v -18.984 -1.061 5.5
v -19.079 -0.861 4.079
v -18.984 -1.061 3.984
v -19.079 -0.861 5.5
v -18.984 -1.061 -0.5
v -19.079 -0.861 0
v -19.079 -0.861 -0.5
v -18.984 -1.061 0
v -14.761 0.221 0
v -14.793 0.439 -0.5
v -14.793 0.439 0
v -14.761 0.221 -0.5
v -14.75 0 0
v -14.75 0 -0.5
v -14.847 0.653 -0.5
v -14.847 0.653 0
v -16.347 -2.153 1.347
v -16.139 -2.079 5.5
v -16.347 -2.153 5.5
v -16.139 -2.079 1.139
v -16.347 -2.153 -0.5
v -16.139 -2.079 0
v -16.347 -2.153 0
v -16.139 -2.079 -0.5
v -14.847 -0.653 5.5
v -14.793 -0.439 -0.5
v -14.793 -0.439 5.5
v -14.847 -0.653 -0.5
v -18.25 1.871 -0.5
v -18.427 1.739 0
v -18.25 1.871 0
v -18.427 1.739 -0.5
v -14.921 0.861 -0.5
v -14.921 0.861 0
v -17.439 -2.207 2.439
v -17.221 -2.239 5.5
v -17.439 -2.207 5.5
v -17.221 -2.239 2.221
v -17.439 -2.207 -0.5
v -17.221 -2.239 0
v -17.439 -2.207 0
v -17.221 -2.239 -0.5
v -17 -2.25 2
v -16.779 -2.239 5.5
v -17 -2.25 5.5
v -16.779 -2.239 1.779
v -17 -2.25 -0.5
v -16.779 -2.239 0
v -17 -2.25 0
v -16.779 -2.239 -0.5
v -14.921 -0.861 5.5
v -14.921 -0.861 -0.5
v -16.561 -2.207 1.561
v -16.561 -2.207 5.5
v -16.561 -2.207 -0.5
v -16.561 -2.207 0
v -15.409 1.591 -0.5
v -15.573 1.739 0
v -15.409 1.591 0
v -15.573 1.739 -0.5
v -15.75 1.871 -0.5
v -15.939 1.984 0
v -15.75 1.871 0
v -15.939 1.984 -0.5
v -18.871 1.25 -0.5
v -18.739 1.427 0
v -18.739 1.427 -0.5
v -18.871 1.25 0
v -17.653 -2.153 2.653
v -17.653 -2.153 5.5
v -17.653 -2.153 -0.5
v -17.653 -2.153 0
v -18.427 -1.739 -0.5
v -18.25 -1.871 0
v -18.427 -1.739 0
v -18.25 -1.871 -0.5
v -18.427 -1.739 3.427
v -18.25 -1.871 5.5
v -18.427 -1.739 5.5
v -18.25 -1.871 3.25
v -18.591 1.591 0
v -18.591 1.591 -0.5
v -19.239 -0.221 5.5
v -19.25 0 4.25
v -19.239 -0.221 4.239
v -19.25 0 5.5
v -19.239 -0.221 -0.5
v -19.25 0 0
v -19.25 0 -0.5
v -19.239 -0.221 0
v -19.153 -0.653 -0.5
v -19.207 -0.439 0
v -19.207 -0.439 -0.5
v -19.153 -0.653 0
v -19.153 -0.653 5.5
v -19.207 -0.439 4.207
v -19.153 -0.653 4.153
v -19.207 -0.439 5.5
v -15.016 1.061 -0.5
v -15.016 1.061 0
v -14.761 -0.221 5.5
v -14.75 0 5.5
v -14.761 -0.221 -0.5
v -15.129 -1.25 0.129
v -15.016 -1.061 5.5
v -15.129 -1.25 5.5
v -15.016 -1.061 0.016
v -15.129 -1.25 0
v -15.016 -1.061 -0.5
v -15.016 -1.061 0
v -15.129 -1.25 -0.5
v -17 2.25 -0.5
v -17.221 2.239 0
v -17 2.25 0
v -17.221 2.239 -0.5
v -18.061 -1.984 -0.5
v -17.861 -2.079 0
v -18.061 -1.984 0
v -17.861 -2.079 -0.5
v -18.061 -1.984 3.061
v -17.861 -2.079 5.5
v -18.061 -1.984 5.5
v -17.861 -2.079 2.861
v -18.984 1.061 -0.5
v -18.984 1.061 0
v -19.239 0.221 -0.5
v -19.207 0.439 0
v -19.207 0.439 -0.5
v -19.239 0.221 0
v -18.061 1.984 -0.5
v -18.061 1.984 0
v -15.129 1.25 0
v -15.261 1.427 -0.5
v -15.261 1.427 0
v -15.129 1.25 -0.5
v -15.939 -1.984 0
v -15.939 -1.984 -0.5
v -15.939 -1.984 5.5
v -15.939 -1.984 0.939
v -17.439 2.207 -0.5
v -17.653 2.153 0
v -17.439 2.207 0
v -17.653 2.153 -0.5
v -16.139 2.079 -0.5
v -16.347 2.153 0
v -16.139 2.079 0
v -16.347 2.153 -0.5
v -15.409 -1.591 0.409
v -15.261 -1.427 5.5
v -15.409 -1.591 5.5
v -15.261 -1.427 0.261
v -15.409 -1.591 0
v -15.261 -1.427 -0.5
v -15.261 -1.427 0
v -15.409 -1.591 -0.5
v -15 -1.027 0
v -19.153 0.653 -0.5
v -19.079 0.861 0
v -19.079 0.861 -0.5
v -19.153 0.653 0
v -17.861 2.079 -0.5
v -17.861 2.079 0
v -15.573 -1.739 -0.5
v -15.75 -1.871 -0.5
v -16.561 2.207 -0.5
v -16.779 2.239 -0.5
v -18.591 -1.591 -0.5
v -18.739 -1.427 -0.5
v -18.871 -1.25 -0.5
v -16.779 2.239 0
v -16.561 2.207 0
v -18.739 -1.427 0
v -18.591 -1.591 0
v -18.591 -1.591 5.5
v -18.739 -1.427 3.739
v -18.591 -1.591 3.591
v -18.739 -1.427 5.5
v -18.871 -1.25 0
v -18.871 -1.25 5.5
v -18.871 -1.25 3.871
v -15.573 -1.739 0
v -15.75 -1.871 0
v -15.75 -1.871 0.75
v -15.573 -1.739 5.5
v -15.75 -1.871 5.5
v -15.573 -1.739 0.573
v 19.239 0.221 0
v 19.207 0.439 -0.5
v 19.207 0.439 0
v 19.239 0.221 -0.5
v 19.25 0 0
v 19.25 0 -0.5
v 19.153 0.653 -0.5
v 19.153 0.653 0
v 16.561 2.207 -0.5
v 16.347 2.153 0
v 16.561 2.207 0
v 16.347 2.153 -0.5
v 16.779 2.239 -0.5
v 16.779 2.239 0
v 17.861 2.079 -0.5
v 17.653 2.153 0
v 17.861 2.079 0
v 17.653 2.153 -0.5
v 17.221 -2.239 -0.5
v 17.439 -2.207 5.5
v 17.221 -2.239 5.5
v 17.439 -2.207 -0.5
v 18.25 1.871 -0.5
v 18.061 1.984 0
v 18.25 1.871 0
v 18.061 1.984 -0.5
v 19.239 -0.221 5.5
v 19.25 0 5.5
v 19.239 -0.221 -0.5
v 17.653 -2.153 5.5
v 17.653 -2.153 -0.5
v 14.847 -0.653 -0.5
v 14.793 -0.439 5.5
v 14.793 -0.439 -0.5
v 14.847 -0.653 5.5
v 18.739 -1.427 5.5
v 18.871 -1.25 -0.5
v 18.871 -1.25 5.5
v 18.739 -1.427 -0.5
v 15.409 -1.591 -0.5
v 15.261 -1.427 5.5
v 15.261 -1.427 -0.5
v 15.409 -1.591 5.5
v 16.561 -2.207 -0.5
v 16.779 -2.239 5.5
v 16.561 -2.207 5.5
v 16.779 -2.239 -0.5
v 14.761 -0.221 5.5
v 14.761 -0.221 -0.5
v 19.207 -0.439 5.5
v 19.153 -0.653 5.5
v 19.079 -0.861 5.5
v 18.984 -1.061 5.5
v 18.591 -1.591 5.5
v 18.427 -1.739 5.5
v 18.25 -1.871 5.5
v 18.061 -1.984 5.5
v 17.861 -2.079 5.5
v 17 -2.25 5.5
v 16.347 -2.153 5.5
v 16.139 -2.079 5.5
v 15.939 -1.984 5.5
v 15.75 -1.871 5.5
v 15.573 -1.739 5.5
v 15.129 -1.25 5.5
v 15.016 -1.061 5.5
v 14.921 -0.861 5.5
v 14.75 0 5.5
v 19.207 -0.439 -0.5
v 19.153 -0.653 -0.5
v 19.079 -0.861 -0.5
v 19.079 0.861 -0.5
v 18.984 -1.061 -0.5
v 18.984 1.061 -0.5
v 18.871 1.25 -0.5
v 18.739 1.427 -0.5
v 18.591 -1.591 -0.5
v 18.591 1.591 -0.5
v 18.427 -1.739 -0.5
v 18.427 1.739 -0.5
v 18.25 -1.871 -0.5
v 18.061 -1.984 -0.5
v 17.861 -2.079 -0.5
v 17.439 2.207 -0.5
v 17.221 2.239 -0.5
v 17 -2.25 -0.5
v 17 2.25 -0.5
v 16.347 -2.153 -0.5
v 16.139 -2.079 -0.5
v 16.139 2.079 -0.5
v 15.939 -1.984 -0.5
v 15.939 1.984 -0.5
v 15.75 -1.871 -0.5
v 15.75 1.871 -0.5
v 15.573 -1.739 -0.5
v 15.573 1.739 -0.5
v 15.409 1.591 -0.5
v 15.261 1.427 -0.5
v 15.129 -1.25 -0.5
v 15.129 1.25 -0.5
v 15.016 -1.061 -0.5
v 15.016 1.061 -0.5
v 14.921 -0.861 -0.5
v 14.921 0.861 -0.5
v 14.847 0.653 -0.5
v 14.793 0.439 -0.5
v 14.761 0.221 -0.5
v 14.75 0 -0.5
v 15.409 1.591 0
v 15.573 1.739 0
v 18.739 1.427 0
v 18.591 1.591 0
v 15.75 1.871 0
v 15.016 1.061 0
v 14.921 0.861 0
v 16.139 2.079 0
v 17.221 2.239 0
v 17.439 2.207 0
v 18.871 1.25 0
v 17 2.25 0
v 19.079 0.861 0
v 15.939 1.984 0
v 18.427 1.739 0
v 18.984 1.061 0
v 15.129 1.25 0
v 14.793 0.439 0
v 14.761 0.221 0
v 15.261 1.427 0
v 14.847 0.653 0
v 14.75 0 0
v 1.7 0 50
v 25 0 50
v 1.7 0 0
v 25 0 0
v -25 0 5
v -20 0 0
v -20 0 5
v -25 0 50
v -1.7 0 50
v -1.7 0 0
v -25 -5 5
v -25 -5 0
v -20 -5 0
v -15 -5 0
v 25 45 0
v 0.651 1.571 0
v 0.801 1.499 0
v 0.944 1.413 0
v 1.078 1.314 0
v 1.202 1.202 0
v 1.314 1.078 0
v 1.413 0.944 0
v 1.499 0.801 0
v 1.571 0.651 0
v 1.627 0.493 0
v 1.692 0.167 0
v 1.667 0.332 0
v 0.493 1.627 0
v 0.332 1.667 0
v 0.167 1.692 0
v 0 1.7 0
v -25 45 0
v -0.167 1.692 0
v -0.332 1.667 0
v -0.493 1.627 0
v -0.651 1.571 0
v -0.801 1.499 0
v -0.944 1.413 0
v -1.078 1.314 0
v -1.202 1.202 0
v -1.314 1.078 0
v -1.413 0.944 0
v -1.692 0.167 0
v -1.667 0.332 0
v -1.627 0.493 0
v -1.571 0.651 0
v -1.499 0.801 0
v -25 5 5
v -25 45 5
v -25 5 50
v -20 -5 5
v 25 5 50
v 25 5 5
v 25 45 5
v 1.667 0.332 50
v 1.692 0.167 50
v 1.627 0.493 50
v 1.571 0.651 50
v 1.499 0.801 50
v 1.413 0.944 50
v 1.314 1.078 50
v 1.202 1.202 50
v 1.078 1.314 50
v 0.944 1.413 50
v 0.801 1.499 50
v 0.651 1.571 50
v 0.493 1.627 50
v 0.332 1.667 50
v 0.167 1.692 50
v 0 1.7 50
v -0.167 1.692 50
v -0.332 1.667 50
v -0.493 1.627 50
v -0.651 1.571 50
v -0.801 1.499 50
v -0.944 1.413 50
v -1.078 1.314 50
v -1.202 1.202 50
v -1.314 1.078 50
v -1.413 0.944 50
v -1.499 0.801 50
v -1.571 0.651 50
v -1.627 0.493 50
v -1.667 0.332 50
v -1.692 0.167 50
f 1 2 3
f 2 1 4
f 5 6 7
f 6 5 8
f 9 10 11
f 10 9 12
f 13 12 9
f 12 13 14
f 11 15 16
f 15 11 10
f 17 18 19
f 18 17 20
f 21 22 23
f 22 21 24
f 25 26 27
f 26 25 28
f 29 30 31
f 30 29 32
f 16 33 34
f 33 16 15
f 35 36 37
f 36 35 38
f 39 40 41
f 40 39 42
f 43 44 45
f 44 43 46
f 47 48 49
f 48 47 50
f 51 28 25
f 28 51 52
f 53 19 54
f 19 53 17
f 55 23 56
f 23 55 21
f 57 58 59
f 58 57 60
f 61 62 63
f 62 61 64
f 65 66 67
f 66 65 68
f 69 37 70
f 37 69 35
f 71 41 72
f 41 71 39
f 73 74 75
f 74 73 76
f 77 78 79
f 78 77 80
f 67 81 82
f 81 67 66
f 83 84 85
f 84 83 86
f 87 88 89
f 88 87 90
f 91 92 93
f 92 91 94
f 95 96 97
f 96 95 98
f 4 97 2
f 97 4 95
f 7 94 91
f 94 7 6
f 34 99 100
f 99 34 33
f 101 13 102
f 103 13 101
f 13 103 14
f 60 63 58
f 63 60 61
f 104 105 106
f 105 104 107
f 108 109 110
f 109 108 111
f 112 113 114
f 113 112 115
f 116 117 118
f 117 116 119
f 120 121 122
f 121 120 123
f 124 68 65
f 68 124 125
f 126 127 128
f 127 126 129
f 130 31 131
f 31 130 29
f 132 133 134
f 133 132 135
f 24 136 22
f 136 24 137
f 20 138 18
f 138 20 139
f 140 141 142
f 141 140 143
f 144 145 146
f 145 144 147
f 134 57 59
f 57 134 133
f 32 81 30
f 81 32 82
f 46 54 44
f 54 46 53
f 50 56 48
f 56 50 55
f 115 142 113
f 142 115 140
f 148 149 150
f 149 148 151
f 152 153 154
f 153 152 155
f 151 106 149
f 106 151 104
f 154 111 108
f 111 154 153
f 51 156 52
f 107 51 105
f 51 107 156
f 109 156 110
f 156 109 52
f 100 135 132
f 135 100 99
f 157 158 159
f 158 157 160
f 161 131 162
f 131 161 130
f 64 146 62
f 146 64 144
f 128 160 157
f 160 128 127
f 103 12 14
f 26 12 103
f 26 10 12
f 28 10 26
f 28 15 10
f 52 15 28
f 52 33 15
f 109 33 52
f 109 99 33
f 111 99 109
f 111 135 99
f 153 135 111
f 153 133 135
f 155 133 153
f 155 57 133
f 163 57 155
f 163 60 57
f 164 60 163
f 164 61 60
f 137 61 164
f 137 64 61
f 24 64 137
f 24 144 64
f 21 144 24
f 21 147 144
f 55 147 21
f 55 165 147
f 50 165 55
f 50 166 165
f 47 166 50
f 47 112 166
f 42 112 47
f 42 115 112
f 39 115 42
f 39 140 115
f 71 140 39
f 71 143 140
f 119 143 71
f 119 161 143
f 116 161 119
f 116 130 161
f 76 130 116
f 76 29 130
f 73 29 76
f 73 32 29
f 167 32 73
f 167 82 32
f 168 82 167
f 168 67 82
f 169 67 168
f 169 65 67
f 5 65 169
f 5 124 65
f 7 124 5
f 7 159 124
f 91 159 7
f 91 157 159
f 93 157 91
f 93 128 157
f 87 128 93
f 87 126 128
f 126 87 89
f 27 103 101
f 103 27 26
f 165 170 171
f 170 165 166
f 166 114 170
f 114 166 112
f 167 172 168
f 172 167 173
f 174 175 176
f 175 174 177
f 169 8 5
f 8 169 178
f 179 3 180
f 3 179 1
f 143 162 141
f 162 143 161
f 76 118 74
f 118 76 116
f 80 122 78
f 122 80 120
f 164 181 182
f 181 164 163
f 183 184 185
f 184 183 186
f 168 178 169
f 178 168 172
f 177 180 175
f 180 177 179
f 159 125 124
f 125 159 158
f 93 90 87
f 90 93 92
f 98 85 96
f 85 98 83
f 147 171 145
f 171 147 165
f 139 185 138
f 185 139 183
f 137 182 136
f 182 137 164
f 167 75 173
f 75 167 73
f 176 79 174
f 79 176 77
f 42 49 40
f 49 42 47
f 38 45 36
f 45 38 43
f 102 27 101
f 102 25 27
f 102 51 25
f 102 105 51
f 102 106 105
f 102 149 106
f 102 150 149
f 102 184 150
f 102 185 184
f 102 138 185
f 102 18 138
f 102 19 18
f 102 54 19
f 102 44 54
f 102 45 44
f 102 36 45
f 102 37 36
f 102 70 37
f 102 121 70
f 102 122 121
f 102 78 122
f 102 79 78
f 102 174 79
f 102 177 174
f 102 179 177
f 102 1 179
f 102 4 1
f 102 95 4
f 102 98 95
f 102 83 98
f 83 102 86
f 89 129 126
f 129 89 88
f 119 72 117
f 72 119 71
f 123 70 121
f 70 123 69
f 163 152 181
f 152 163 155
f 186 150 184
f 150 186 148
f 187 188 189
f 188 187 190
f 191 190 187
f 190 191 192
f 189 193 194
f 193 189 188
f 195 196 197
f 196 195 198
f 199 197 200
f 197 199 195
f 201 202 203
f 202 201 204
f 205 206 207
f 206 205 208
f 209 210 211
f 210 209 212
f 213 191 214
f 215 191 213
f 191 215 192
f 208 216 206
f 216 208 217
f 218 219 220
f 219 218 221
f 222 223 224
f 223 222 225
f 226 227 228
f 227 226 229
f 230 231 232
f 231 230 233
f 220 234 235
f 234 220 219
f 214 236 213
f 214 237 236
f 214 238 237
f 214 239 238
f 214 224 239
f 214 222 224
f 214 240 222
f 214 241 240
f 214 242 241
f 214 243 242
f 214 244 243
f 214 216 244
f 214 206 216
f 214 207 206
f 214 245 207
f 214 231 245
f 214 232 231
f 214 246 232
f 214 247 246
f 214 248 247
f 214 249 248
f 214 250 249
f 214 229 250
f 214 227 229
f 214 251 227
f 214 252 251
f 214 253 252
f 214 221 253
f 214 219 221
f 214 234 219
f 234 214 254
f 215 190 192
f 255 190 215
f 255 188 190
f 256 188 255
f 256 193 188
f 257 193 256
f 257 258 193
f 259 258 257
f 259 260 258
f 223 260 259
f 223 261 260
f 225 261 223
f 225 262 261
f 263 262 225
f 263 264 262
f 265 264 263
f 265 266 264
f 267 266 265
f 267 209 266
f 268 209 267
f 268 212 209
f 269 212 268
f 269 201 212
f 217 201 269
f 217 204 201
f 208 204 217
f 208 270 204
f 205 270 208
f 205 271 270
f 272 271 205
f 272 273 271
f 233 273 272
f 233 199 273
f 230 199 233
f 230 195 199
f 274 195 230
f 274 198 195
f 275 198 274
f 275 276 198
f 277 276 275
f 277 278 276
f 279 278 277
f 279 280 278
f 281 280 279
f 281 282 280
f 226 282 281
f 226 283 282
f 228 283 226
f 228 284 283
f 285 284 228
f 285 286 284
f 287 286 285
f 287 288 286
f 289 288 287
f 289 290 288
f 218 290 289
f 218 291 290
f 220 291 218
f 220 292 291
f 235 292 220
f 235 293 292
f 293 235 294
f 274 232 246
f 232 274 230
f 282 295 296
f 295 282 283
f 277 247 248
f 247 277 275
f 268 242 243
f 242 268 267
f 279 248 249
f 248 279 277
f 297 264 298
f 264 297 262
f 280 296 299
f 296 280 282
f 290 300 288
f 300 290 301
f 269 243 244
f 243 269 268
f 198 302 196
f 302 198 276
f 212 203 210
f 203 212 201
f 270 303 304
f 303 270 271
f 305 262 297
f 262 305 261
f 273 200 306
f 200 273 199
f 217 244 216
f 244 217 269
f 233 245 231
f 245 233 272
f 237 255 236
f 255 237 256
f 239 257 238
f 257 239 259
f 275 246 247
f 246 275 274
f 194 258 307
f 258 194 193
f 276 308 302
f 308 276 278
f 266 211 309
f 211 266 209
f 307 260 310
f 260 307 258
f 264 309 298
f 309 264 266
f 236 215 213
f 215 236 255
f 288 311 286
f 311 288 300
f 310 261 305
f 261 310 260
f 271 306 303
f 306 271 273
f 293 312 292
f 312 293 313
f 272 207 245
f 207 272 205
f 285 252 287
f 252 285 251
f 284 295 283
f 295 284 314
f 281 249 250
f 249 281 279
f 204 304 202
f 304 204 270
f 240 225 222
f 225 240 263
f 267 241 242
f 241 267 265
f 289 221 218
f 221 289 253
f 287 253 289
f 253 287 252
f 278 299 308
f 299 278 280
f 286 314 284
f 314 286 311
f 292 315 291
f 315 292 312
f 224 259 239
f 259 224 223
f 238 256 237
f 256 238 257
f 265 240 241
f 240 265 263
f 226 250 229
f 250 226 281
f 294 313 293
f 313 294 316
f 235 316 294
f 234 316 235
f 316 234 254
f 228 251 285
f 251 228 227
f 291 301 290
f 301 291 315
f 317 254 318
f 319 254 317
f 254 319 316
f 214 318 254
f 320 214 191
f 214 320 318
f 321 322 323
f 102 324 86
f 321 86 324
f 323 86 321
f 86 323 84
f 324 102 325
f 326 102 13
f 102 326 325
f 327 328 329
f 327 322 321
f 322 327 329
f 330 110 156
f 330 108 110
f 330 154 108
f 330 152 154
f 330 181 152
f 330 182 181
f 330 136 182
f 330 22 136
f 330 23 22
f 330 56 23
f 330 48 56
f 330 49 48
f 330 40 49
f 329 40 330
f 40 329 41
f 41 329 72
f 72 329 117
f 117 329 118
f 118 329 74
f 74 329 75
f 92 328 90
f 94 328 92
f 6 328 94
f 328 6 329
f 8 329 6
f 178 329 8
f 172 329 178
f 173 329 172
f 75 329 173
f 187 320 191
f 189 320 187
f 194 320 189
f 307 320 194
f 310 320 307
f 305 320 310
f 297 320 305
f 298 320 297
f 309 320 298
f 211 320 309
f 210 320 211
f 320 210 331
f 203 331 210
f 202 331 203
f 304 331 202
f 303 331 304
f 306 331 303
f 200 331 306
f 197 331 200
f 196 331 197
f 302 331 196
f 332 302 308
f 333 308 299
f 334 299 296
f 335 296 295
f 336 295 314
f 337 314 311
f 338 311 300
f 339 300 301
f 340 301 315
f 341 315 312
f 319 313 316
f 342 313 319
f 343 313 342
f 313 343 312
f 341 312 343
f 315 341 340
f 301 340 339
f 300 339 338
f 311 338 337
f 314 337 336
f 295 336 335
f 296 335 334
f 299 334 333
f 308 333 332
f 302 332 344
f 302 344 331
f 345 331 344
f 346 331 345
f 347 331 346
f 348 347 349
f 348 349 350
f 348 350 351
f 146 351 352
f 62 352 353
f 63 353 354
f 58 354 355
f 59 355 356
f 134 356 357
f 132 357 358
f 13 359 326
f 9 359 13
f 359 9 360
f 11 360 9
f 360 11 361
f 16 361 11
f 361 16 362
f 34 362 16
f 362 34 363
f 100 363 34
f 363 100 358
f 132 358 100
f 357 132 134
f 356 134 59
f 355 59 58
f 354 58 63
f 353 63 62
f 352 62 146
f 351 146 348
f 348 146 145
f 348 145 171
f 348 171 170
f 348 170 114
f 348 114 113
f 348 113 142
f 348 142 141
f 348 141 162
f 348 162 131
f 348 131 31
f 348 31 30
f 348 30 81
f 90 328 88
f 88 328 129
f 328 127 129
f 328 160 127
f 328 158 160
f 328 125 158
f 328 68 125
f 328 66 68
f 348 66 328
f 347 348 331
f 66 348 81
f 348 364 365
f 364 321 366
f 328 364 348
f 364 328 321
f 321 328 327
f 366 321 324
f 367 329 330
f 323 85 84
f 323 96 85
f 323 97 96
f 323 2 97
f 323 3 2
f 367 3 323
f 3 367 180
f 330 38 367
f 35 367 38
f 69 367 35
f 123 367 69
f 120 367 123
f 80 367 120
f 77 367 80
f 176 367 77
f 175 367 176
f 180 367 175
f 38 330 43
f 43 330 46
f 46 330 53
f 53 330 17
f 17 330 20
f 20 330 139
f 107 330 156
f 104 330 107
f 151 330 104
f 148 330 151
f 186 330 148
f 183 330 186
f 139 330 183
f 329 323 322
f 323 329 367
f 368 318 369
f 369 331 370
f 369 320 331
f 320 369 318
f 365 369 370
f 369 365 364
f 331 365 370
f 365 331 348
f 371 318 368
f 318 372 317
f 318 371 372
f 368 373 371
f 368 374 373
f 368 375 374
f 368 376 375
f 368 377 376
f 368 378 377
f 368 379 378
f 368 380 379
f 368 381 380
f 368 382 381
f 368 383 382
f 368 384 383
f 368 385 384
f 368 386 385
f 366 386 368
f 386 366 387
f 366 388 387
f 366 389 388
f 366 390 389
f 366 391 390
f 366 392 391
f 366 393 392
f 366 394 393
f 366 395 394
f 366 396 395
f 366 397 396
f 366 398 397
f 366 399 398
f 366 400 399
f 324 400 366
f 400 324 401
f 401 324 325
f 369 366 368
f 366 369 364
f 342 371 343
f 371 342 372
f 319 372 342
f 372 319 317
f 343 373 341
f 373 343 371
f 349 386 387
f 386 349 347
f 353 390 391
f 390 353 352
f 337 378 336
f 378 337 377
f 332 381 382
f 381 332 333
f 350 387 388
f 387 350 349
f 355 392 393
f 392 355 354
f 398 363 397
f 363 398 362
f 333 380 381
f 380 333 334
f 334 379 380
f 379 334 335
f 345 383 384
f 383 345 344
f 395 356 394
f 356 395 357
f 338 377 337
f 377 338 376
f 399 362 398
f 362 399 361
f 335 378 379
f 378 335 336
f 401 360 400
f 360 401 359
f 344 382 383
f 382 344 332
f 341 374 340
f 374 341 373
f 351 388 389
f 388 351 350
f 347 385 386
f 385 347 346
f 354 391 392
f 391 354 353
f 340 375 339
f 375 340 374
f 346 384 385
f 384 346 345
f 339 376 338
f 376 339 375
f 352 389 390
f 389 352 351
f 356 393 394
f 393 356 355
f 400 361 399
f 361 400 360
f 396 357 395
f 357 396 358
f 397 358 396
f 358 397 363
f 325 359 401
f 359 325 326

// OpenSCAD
// L-shaped mounting bracket for NEMA 17 stepper motor (e.g. syringe pump)
// Print orientation: base plate on bed, motor plate building up in +Z

$fn = 64;

// ---- Base plate ----
base_x_min = -25;   // base plate X start
base_x_max = 25;    // base plate X end
base_y_min = 0;     // base plate Y start
base_y_max = 45;    // base plate Y end
base_z_max = 5;     // base plate thickness

// ---- Motor plate ----
motor_x_min = -25;  // motor plate X start
motor_x_max = 25;  // motor plate X end
motor_y_min = 0;   // motor plate Y start
motor_y_max = 5;   // motor plate Y end (on back edge of base)
motor_z_max = 50;  // motor plate height

// ---- Boss hole ----
boss_d = 23;        // motor boss hole diameter
boss_x = 0;         // boss hole X centre
boss_z = 28;        // boss hole Z centre

// ---- Screw holes ----
screw_d = 3.4;      // M3 screw hole diameter
screw_pattern = 31; // square pattern side length

// ---- Gussets ----
gusset_x_min = -25; // left gusset X start
gusset_x_max = -20; // left gusset X end
gusset_y_max = 5;   // gusset leg along Y
gusset_z_max = 5;   // gusset leg along Z
gusset_t = 5;       // gusset thickness (X direction)

// ---- Cutting overlap ----
eps = 0.5;          // extension past cut faces

difference() {
    union() {
        // Base plate with two vertical through-holes (M4)
        translate([base_x_min, base_y_min, 0])
            cube([base_x_max - base_x_min, base_y_max - base_y_min, base_z_max]);
        for (sx = [-17, 17])
            translate([sx, base_y_min, -eps])
                cylinder(d = 4.5, h = base_z_max + 2 * eps);

        // Vertical motor plate standing on back edge of base
        translate([motor_x_min, motor_y_min, 0])
            cube([motor_x_max - motor_x_min, motor_y_max, motor_z_max]);

        // Triangular gussets flush with left and right edges
        for (sx = [gusset_x_min, gusset_x_max])
            translate([sx, 0, 0])
                rotate([90, 0, 0])
                    linear_extrude(height = gusset_t)
                        polygon(points = [[0, 0], [gusset_y_max, 0], [0, gusset_z_max]]);
    }

    // Boss hole through motor plate along Y
    translate([boss_x, motor_y_min - eps, boss_z])
        rotate([90, 0, 0])
            cylinder(d = boss_d, h = motor_y_max - motor_y_min + 2 * eps);

    // Four M3 screw holes on 31 mm square pattern centred on boss hole
    for (a = [0, 90, 180, 270])
        rotate([0, 0, a])
            translate([0, 0, -eps])
                cylinder(d = screw_d, h = motor_z_max + 2 * eps);
}
